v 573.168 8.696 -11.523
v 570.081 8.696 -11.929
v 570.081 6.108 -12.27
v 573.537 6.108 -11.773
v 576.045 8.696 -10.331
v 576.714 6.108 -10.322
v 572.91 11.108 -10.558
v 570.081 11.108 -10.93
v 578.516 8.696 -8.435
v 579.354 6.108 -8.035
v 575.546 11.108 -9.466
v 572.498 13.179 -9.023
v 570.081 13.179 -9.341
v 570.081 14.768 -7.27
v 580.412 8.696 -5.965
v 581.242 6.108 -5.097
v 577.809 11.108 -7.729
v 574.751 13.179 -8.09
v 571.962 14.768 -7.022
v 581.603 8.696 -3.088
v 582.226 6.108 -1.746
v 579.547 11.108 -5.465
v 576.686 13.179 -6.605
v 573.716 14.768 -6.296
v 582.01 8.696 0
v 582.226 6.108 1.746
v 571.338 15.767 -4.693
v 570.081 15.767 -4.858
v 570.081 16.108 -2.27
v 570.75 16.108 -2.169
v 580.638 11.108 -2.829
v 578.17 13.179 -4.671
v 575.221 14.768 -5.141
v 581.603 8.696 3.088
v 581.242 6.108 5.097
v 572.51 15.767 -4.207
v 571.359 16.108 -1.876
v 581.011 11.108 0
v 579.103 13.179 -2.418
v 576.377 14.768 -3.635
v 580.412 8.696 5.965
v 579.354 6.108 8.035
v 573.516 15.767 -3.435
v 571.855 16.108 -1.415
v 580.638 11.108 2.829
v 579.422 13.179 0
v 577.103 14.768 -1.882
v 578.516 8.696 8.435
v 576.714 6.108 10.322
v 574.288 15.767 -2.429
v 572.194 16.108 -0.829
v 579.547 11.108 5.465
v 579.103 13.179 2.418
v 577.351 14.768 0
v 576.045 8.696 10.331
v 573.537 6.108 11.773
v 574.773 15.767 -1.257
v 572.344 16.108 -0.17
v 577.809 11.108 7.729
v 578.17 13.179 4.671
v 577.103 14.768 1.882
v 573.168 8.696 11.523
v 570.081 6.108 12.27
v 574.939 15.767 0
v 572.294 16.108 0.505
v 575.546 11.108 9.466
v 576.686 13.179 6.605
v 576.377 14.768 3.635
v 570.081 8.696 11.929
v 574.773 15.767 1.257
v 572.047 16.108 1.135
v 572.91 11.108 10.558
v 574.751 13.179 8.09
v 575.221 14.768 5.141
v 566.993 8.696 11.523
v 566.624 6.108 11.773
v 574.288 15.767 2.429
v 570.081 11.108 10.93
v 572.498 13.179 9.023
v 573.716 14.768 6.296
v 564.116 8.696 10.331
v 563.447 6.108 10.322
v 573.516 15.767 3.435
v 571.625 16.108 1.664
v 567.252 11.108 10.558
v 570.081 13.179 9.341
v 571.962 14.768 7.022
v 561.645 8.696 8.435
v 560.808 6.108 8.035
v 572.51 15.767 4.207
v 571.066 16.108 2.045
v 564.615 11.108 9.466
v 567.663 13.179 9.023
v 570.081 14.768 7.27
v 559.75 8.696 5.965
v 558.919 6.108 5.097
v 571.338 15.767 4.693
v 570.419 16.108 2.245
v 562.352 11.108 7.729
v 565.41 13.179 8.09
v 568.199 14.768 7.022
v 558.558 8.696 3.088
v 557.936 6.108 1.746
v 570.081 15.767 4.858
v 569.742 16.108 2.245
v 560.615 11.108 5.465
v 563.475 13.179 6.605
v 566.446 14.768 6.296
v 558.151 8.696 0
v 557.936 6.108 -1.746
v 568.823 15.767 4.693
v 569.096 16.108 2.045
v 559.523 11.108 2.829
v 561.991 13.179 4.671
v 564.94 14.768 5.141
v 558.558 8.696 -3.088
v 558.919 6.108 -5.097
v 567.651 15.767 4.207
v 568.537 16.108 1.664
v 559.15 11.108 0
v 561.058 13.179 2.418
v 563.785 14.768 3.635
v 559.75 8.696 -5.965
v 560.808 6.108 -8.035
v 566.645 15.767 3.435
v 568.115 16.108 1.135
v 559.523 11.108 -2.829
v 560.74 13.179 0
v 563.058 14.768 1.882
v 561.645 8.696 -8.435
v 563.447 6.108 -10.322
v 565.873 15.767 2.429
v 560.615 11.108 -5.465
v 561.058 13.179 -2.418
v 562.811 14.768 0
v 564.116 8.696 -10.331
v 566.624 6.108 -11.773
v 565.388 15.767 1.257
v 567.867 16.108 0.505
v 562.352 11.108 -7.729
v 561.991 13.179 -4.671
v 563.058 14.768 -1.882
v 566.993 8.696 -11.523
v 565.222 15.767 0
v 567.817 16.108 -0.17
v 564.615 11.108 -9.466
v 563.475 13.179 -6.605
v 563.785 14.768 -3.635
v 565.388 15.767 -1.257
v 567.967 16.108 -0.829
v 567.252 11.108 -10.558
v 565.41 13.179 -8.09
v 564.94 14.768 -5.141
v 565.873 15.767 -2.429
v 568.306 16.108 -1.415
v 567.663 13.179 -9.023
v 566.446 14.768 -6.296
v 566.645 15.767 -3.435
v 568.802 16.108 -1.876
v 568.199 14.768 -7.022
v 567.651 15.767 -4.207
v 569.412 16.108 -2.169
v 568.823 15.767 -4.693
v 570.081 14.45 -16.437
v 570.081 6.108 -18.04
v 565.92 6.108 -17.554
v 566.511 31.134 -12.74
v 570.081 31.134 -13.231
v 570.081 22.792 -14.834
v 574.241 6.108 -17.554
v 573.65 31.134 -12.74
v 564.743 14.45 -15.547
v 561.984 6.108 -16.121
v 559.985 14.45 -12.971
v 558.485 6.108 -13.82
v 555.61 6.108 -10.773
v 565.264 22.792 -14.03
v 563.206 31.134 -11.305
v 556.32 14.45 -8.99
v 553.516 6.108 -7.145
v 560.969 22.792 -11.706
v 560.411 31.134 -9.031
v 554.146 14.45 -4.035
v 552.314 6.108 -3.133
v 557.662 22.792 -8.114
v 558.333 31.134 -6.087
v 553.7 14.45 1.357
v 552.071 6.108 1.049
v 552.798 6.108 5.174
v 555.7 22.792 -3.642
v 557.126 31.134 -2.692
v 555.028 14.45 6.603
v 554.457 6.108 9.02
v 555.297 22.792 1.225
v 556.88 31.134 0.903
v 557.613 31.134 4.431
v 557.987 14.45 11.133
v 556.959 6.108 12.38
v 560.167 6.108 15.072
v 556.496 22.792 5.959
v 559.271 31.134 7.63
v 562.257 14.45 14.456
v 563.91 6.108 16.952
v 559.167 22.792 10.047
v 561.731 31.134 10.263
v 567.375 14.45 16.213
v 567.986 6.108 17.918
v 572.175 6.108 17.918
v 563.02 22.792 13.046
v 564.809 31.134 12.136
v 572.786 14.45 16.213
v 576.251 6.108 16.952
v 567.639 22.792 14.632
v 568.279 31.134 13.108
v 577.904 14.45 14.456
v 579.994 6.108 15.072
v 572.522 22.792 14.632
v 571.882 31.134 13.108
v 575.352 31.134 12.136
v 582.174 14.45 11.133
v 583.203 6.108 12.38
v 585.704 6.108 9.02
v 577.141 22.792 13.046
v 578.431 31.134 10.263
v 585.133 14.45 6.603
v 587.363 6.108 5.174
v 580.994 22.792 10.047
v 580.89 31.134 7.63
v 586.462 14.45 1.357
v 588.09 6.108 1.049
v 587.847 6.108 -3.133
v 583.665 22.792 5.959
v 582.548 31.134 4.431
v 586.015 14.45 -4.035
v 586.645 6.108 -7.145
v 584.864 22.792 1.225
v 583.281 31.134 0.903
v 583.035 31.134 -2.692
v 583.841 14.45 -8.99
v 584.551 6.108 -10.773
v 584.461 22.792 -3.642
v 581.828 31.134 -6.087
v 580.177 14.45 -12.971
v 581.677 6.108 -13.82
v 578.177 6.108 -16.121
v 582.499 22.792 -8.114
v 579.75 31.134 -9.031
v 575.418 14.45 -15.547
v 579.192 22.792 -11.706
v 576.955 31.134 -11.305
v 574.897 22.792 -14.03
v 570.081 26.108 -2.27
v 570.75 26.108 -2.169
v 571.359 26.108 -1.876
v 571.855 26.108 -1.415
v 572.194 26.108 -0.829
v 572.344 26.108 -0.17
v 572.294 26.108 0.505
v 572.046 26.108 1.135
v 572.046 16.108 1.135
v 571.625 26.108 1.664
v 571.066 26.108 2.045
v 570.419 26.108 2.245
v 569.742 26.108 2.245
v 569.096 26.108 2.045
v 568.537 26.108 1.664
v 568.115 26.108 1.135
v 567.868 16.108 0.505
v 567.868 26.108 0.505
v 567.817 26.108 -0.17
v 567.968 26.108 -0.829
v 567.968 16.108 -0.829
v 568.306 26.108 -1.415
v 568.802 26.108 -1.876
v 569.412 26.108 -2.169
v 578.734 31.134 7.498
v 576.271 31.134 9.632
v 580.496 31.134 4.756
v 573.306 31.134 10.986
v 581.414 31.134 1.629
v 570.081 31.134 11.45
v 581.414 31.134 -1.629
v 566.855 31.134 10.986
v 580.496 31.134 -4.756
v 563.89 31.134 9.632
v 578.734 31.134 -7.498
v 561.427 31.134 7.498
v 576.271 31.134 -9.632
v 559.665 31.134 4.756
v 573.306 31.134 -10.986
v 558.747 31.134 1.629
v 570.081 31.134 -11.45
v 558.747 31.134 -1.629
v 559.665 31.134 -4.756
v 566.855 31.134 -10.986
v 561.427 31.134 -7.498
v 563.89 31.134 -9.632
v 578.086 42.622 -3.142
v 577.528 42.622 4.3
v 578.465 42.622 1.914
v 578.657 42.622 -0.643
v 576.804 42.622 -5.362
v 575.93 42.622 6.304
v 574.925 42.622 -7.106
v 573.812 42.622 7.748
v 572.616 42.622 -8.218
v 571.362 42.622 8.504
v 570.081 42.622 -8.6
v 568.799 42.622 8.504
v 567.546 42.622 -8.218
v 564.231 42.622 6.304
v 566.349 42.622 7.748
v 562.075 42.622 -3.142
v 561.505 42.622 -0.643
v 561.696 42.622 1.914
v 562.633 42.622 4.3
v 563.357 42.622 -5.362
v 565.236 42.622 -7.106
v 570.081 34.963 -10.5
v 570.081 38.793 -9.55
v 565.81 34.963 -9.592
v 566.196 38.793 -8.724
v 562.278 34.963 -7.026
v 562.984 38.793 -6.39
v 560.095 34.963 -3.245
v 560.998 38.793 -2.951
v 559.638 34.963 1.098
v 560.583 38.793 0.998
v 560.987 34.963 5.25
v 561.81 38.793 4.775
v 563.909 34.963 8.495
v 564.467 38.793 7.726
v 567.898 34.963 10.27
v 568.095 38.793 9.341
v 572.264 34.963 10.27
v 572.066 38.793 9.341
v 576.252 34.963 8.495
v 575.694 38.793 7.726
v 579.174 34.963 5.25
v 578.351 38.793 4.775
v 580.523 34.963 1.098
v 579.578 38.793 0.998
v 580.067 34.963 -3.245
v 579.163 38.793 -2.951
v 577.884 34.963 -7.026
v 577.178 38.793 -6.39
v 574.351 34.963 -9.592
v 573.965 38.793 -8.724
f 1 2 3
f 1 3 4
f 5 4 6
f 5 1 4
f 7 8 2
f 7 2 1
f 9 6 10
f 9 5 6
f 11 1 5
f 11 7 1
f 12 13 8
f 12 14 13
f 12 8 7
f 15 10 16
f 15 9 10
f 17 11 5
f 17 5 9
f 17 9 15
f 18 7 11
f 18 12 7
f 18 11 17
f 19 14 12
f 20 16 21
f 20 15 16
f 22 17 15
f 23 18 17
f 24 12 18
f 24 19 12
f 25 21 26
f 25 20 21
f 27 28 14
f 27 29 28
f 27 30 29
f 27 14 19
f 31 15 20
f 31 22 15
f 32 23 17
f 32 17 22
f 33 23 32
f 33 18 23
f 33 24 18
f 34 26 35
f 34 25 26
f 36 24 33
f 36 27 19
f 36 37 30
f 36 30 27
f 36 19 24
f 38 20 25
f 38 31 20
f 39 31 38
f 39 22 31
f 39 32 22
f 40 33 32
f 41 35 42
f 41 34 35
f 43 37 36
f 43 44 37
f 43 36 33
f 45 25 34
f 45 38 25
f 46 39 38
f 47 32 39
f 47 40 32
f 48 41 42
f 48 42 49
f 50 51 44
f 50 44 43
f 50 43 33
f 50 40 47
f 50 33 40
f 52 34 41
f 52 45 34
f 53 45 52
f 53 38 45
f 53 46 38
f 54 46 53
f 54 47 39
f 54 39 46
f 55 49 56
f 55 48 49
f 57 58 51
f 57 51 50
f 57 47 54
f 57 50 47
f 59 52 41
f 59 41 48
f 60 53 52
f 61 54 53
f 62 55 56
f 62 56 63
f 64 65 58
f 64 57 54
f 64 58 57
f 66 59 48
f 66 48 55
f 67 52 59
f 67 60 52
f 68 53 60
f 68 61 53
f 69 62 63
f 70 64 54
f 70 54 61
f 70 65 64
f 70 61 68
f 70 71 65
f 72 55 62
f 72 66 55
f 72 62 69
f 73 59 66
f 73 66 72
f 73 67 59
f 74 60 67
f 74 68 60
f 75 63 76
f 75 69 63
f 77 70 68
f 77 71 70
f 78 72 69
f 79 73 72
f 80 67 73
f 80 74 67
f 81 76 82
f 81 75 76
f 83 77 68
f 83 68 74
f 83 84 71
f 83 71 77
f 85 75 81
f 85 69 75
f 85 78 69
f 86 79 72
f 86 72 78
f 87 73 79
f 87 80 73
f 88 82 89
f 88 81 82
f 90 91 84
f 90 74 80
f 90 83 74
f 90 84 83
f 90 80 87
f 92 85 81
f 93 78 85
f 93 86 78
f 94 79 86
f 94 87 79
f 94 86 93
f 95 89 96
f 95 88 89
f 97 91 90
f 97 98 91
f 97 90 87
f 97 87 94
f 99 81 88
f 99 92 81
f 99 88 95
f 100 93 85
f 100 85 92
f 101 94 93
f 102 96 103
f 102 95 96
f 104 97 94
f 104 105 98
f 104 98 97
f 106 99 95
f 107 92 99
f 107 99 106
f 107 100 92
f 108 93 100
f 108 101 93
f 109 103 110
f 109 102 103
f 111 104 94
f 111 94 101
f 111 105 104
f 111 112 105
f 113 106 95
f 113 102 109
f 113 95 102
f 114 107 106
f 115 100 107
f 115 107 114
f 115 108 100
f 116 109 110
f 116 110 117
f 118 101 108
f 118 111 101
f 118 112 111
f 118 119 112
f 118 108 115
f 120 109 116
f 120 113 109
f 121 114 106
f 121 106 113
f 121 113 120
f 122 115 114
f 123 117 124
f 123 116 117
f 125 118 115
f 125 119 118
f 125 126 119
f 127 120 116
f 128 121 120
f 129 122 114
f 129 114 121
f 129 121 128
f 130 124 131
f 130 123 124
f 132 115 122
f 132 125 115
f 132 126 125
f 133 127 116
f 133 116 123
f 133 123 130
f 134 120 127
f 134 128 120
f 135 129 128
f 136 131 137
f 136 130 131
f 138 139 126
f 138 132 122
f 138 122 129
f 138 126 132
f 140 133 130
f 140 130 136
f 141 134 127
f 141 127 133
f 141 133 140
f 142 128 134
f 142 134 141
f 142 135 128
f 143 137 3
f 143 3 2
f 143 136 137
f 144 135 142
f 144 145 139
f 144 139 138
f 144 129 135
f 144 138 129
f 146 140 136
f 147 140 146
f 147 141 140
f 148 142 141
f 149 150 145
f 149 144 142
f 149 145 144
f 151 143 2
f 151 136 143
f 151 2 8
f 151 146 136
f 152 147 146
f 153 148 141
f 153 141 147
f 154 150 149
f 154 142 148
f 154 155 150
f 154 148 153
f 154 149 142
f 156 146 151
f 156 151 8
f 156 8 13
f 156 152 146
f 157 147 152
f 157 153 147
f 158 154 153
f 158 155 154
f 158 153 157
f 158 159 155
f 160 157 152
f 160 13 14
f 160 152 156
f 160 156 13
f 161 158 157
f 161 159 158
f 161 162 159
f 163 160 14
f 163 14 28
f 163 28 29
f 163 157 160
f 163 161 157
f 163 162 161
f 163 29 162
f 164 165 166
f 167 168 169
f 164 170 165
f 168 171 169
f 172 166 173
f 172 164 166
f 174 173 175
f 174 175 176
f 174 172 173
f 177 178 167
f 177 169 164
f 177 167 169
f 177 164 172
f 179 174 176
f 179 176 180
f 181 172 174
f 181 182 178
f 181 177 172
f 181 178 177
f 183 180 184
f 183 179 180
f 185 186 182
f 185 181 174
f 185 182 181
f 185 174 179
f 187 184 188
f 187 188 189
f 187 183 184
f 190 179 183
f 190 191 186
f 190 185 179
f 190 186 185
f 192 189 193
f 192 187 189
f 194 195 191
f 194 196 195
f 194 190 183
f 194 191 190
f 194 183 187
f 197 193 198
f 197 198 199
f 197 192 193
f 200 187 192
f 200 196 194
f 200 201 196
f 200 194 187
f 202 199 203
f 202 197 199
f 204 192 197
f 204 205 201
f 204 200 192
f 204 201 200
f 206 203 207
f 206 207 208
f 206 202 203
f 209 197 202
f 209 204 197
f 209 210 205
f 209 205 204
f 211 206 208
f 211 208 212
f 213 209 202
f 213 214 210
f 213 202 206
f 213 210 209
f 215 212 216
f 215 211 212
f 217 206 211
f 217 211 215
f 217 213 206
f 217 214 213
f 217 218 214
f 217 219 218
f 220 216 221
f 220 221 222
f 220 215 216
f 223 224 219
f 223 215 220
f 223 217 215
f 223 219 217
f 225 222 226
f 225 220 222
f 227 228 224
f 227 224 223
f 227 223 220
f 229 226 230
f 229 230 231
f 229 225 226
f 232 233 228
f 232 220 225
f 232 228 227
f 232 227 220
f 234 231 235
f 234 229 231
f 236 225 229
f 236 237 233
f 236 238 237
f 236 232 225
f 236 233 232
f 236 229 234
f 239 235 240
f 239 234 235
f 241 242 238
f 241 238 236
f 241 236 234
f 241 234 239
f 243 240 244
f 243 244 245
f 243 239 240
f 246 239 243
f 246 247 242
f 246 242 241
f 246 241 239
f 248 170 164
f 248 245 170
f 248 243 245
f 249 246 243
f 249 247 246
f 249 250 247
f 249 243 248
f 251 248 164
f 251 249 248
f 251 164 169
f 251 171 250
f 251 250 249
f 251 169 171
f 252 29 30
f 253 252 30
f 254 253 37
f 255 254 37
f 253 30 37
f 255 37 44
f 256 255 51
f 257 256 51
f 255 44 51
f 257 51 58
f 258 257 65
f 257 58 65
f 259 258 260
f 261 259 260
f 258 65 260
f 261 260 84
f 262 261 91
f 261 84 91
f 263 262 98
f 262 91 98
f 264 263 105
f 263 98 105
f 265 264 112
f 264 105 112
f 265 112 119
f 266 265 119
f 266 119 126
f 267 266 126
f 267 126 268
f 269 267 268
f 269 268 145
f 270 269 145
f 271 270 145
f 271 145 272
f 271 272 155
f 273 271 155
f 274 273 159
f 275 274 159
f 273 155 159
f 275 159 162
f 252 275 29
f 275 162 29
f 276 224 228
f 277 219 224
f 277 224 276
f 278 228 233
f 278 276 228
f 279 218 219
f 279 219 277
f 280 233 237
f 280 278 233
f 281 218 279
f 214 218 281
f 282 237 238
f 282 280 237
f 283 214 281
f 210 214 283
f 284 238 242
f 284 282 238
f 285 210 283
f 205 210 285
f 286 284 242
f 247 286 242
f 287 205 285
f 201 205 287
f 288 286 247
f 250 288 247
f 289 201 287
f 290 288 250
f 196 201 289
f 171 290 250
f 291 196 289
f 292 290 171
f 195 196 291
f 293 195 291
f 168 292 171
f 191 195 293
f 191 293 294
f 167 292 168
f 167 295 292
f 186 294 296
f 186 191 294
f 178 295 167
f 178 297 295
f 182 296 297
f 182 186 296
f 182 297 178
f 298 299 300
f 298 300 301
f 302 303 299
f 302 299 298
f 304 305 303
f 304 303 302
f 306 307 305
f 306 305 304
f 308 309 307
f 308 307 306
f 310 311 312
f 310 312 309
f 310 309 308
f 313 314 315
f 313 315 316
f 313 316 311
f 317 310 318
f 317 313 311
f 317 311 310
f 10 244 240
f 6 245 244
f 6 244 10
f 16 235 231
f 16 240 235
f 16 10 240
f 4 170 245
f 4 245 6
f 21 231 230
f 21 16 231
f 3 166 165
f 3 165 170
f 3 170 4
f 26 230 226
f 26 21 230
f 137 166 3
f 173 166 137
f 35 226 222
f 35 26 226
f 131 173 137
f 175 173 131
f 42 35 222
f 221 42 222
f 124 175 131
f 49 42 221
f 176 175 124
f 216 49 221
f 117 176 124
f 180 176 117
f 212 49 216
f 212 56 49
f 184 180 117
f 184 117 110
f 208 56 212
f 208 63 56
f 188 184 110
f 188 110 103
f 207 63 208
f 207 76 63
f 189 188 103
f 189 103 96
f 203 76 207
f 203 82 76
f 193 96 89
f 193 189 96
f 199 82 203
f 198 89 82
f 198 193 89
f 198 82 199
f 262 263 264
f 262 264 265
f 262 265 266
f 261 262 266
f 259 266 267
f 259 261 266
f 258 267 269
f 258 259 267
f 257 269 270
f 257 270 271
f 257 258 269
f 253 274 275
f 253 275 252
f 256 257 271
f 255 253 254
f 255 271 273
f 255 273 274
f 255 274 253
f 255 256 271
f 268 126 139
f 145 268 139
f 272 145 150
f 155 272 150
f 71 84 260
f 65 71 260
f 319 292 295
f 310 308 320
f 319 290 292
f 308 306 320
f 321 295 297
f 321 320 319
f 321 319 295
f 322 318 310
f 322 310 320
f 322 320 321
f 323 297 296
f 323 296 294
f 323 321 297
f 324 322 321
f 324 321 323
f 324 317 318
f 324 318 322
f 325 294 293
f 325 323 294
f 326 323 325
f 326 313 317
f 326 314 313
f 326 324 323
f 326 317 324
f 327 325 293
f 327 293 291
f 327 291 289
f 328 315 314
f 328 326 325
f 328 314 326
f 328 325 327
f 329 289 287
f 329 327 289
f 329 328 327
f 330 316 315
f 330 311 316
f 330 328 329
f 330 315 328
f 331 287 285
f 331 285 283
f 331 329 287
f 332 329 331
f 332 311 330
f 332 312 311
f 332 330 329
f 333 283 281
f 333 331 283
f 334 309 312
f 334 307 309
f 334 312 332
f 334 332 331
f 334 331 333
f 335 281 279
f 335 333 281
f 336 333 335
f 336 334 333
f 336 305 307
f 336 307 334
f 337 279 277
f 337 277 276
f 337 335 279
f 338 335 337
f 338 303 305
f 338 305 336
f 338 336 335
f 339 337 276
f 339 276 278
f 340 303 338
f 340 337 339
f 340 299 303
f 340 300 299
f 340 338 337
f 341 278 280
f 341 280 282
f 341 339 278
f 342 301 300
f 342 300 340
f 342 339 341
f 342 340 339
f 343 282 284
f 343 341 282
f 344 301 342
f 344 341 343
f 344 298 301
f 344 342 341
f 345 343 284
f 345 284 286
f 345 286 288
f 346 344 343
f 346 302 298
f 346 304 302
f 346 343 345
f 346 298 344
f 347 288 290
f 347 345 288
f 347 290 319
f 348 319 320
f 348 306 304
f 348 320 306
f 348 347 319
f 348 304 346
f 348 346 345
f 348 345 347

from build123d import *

# Parameters (mm, degrees)
SKETCH3_R          = 12.26998913
CUT_EXTRUDE1_DEPTH = 10
FILLET1_R          = 10
SKETCH4_R          = 2.26998913
CUT_EXTRUDE2_DEPTH = 10


with BuildPart() as part:
    # Sketch1 → Revolve1 (revolve)
    with BuildSketch(Plane.XY, mode=Mode.PRIVATE) as revolve1_sk:
        Polygon((558.630730273, 31.133640952), (561.480624089, 42.622275397), (570.080624089, 42.622275397), (570.080624089, 6.108010882), (552.040350824, 6.108010882), (556.849546639, 31.133640952), align=None)
    revolve(revolve1_sk.sketch.rotate(Axis((570.080624089, 6.108010882, 0), (0, 1, 0)), 270), axis=Axis((570.080624089, 6.108010882, 0), (0, 1, 0)))

    # Sketch3 → Cut-Extrude1 (cut)
    with BuildSketch(Plane(origin=(0, 6.108010882, 0), x_dir=(-1, 0, 0), z_dir=(0, -1, 0))):
        with Locations(Location((-570.080624089, 0, 0), (0, 0, 90))):
            Circle(SKETCH3_R)
    extrude(amount=-CUT_EXTRUDE1_DEPTH, mode=Mode.SUBTRACT)

    # Fillet1
    fillet1_edges = [part.edges().sort_by_distance(p)[0] for p in [
        (570.080624089, 16.108010882, 12.26998913),
    ]]
    fillet(fillet1_edges, radius=FILLET1_R - 0.0001)  # a hair under: the kernel refuses the full size

    # Sketch4 → Cut-Extrude2 (cut)
    with BuildSketch(Plane(origin=(0, 16.108010882, 0), x_dir=(-1, 0, 0), z_dir=(0, -1, 0))):
        with Locations(Location((-570.080624089, 0, 0), (0, 0, 90))):
            Circle(SKETCH4_R)
    extrude(amount=-CUT_EXTRUDE2_DEPTH, mode=Mode.SUBTRACT)


solid = part.part
